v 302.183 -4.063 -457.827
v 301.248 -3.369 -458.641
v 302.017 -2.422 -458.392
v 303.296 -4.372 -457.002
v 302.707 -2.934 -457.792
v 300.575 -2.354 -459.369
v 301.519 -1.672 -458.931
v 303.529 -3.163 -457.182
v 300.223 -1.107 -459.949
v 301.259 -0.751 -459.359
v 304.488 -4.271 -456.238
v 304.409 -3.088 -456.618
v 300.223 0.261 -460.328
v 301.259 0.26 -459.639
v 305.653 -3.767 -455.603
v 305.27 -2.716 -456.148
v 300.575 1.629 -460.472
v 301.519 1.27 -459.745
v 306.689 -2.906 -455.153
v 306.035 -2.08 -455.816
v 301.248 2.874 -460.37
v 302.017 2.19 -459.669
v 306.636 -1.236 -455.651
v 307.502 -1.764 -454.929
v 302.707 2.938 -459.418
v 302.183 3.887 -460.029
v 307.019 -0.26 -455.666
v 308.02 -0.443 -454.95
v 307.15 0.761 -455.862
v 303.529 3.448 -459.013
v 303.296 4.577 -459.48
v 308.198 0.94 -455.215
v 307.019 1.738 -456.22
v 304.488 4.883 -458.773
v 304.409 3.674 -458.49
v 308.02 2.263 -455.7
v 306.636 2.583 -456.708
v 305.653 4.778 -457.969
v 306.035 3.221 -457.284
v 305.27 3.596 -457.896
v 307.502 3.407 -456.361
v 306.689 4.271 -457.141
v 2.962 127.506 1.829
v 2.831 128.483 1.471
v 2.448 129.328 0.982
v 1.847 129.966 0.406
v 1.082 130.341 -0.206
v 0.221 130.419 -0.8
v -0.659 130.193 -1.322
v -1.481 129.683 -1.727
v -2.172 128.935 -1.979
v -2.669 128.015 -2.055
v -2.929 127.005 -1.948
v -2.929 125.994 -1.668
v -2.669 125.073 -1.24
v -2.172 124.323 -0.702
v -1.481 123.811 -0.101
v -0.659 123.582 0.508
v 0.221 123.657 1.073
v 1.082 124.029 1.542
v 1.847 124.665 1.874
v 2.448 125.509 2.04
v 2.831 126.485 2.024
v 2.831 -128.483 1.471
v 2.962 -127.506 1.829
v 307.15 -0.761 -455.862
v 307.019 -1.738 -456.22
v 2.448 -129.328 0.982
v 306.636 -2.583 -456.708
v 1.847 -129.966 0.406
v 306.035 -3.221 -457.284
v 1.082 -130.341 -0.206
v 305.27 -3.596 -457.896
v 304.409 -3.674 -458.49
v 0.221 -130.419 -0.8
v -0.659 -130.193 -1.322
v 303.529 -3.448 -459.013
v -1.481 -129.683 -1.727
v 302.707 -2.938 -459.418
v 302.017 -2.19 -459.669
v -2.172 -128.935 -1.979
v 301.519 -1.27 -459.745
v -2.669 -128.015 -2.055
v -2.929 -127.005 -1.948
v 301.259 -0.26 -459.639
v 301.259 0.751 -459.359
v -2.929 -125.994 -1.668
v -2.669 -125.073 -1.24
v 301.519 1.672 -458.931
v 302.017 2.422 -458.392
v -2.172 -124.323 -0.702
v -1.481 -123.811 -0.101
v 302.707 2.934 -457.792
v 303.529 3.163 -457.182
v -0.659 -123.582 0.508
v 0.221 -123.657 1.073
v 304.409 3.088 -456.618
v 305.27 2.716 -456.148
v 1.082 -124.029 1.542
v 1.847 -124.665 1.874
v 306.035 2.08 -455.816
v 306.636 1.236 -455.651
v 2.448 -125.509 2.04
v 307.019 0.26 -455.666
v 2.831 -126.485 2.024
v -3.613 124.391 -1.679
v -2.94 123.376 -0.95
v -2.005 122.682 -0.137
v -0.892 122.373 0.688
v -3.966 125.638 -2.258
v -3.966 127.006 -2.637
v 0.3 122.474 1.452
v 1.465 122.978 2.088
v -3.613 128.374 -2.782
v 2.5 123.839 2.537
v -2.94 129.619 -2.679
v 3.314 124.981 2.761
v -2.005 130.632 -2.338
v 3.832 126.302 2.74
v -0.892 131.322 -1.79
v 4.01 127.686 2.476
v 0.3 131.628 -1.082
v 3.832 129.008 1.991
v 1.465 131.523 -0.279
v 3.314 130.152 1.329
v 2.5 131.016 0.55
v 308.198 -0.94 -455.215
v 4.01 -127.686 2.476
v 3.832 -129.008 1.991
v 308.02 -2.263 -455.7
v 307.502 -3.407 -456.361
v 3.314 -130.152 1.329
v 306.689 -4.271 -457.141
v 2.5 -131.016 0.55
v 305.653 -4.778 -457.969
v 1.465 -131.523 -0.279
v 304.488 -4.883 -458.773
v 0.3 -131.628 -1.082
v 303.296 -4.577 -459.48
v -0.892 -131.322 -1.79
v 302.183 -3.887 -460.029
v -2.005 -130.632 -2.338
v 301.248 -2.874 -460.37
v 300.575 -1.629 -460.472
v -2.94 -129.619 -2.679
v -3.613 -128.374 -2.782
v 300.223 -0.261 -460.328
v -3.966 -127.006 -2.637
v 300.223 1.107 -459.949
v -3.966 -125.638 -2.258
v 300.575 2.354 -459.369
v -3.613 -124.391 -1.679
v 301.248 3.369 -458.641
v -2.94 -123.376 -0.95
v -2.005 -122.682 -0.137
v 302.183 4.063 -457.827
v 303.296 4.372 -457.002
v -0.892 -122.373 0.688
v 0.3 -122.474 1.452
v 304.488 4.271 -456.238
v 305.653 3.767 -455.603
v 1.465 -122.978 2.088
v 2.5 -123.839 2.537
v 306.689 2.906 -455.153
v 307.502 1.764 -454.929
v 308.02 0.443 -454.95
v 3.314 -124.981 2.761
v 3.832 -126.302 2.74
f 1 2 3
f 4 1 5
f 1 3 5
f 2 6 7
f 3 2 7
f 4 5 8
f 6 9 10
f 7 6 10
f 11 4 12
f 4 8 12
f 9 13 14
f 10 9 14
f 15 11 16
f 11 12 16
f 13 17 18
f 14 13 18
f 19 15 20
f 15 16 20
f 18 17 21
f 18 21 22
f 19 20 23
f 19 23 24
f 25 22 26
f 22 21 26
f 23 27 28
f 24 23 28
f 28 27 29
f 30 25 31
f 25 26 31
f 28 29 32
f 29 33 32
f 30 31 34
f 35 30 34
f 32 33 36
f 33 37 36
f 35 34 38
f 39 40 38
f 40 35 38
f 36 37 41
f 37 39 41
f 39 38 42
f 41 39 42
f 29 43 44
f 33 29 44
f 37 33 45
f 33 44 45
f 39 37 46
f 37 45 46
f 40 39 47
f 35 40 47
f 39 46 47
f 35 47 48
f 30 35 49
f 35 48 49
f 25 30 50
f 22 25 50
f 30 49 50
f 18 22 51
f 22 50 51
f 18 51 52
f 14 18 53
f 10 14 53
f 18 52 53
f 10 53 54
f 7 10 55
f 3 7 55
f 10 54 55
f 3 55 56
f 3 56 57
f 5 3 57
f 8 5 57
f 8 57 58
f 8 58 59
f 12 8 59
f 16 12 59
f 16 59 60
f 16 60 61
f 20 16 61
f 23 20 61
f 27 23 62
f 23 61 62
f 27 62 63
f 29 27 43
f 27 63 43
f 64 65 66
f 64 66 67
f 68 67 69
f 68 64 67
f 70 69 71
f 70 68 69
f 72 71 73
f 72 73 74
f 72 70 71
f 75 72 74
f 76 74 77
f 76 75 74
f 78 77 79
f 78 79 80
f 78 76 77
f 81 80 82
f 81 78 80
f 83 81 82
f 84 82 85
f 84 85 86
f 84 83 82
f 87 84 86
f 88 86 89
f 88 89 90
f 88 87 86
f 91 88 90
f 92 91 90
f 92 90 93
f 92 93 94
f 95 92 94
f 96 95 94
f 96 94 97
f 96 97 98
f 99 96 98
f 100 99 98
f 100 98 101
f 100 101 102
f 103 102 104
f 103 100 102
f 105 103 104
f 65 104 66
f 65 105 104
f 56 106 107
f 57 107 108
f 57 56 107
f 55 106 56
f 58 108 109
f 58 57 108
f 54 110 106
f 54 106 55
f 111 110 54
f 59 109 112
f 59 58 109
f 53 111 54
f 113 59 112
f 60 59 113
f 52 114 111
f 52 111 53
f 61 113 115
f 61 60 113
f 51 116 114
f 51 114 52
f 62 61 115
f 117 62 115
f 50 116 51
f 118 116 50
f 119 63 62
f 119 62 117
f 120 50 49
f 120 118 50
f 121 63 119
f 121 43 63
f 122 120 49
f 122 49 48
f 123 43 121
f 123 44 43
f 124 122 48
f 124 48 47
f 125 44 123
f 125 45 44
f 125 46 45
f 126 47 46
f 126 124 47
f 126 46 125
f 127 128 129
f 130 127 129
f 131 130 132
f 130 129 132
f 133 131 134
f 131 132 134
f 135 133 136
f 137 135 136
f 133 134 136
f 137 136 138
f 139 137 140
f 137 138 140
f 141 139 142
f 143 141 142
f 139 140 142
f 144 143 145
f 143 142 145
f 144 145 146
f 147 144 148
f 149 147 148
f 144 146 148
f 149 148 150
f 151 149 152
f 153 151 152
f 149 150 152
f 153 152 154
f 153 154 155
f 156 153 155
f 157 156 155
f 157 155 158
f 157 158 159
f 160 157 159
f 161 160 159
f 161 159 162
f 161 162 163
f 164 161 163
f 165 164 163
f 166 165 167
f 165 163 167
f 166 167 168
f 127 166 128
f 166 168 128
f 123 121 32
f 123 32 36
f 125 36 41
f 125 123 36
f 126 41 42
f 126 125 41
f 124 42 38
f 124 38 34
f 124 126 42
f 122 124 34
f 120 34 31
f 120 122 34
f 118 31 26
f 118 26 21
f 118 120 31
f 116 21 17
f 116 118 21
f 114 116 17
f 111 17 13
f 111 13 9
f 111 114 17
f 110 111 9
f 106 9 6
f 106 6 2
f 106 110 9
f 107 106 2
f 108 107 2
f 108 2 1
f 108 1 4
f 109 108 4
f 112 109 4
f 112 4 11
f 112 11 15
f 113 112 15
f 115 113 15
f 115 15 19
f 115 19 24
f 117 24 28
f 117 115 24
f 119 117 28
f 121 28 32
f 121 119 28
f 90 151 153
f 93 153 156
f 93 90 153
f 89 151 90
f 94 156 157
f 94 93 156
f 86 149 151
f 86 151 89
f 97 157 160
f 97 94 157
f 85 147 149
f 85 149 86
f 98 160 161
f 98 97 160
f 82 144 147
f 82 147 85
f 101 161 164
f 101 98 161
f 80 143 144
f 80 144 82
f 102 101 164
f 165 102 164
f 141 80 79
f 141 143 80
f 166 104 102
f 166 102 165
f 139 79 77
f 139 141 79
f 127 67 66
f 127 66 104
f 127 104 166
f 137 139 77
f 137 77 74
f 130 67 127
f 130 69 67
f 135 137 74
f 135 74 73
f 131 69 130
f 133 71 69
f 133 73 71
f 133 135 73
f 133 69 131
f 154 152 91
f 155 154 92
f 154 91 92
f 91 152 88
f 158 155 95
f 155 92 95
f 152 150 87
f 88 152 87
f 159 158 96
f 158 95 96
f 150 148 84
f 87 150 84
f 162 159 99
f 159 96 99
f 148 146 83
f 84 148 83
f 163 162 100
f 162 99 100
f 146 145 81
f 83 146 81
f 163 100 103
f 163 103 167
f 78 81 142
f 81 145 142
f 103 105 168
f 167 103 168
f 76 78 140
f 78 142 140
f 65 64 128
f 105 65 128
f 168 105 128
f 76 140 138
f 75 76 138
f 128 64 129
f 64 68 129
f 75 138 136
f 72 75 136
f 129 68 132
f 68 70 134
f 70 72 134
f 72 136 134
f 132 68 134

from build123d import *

# Parameters (mm, degrees)
F7_R     = 4.7625
F7_R_2   = 3.5179
F8_DEPTH = 563.9816


with BuildPart() as f8:
    # F7 (on 3pt) → F8 (new body)
    with BuildSketch(Plane(origin=(-15.3938434104, -6.414101421, 23.1620329091), x_dir=(0.8420764353, -0.1439434241, 0.5197956981), z_dir=(0.5393582085, 0.2247325869, -0.8115343415))):
        with Locations((18.2808148576, 122.3937127784)):
            Circle(F7_R)
        with Locations((18.2808148576, 122.3937127784)):
            Circle(F7_R_2, mode=Mode.SUBTRACT)
    extrude(amount=F8_DEPTH)


with BuildPart() as f9_1:
    # F9: instance of F8
    add(f8.part.mirror(Plane.XZ))


solid = Compound([f8.part, f9_1.part])
